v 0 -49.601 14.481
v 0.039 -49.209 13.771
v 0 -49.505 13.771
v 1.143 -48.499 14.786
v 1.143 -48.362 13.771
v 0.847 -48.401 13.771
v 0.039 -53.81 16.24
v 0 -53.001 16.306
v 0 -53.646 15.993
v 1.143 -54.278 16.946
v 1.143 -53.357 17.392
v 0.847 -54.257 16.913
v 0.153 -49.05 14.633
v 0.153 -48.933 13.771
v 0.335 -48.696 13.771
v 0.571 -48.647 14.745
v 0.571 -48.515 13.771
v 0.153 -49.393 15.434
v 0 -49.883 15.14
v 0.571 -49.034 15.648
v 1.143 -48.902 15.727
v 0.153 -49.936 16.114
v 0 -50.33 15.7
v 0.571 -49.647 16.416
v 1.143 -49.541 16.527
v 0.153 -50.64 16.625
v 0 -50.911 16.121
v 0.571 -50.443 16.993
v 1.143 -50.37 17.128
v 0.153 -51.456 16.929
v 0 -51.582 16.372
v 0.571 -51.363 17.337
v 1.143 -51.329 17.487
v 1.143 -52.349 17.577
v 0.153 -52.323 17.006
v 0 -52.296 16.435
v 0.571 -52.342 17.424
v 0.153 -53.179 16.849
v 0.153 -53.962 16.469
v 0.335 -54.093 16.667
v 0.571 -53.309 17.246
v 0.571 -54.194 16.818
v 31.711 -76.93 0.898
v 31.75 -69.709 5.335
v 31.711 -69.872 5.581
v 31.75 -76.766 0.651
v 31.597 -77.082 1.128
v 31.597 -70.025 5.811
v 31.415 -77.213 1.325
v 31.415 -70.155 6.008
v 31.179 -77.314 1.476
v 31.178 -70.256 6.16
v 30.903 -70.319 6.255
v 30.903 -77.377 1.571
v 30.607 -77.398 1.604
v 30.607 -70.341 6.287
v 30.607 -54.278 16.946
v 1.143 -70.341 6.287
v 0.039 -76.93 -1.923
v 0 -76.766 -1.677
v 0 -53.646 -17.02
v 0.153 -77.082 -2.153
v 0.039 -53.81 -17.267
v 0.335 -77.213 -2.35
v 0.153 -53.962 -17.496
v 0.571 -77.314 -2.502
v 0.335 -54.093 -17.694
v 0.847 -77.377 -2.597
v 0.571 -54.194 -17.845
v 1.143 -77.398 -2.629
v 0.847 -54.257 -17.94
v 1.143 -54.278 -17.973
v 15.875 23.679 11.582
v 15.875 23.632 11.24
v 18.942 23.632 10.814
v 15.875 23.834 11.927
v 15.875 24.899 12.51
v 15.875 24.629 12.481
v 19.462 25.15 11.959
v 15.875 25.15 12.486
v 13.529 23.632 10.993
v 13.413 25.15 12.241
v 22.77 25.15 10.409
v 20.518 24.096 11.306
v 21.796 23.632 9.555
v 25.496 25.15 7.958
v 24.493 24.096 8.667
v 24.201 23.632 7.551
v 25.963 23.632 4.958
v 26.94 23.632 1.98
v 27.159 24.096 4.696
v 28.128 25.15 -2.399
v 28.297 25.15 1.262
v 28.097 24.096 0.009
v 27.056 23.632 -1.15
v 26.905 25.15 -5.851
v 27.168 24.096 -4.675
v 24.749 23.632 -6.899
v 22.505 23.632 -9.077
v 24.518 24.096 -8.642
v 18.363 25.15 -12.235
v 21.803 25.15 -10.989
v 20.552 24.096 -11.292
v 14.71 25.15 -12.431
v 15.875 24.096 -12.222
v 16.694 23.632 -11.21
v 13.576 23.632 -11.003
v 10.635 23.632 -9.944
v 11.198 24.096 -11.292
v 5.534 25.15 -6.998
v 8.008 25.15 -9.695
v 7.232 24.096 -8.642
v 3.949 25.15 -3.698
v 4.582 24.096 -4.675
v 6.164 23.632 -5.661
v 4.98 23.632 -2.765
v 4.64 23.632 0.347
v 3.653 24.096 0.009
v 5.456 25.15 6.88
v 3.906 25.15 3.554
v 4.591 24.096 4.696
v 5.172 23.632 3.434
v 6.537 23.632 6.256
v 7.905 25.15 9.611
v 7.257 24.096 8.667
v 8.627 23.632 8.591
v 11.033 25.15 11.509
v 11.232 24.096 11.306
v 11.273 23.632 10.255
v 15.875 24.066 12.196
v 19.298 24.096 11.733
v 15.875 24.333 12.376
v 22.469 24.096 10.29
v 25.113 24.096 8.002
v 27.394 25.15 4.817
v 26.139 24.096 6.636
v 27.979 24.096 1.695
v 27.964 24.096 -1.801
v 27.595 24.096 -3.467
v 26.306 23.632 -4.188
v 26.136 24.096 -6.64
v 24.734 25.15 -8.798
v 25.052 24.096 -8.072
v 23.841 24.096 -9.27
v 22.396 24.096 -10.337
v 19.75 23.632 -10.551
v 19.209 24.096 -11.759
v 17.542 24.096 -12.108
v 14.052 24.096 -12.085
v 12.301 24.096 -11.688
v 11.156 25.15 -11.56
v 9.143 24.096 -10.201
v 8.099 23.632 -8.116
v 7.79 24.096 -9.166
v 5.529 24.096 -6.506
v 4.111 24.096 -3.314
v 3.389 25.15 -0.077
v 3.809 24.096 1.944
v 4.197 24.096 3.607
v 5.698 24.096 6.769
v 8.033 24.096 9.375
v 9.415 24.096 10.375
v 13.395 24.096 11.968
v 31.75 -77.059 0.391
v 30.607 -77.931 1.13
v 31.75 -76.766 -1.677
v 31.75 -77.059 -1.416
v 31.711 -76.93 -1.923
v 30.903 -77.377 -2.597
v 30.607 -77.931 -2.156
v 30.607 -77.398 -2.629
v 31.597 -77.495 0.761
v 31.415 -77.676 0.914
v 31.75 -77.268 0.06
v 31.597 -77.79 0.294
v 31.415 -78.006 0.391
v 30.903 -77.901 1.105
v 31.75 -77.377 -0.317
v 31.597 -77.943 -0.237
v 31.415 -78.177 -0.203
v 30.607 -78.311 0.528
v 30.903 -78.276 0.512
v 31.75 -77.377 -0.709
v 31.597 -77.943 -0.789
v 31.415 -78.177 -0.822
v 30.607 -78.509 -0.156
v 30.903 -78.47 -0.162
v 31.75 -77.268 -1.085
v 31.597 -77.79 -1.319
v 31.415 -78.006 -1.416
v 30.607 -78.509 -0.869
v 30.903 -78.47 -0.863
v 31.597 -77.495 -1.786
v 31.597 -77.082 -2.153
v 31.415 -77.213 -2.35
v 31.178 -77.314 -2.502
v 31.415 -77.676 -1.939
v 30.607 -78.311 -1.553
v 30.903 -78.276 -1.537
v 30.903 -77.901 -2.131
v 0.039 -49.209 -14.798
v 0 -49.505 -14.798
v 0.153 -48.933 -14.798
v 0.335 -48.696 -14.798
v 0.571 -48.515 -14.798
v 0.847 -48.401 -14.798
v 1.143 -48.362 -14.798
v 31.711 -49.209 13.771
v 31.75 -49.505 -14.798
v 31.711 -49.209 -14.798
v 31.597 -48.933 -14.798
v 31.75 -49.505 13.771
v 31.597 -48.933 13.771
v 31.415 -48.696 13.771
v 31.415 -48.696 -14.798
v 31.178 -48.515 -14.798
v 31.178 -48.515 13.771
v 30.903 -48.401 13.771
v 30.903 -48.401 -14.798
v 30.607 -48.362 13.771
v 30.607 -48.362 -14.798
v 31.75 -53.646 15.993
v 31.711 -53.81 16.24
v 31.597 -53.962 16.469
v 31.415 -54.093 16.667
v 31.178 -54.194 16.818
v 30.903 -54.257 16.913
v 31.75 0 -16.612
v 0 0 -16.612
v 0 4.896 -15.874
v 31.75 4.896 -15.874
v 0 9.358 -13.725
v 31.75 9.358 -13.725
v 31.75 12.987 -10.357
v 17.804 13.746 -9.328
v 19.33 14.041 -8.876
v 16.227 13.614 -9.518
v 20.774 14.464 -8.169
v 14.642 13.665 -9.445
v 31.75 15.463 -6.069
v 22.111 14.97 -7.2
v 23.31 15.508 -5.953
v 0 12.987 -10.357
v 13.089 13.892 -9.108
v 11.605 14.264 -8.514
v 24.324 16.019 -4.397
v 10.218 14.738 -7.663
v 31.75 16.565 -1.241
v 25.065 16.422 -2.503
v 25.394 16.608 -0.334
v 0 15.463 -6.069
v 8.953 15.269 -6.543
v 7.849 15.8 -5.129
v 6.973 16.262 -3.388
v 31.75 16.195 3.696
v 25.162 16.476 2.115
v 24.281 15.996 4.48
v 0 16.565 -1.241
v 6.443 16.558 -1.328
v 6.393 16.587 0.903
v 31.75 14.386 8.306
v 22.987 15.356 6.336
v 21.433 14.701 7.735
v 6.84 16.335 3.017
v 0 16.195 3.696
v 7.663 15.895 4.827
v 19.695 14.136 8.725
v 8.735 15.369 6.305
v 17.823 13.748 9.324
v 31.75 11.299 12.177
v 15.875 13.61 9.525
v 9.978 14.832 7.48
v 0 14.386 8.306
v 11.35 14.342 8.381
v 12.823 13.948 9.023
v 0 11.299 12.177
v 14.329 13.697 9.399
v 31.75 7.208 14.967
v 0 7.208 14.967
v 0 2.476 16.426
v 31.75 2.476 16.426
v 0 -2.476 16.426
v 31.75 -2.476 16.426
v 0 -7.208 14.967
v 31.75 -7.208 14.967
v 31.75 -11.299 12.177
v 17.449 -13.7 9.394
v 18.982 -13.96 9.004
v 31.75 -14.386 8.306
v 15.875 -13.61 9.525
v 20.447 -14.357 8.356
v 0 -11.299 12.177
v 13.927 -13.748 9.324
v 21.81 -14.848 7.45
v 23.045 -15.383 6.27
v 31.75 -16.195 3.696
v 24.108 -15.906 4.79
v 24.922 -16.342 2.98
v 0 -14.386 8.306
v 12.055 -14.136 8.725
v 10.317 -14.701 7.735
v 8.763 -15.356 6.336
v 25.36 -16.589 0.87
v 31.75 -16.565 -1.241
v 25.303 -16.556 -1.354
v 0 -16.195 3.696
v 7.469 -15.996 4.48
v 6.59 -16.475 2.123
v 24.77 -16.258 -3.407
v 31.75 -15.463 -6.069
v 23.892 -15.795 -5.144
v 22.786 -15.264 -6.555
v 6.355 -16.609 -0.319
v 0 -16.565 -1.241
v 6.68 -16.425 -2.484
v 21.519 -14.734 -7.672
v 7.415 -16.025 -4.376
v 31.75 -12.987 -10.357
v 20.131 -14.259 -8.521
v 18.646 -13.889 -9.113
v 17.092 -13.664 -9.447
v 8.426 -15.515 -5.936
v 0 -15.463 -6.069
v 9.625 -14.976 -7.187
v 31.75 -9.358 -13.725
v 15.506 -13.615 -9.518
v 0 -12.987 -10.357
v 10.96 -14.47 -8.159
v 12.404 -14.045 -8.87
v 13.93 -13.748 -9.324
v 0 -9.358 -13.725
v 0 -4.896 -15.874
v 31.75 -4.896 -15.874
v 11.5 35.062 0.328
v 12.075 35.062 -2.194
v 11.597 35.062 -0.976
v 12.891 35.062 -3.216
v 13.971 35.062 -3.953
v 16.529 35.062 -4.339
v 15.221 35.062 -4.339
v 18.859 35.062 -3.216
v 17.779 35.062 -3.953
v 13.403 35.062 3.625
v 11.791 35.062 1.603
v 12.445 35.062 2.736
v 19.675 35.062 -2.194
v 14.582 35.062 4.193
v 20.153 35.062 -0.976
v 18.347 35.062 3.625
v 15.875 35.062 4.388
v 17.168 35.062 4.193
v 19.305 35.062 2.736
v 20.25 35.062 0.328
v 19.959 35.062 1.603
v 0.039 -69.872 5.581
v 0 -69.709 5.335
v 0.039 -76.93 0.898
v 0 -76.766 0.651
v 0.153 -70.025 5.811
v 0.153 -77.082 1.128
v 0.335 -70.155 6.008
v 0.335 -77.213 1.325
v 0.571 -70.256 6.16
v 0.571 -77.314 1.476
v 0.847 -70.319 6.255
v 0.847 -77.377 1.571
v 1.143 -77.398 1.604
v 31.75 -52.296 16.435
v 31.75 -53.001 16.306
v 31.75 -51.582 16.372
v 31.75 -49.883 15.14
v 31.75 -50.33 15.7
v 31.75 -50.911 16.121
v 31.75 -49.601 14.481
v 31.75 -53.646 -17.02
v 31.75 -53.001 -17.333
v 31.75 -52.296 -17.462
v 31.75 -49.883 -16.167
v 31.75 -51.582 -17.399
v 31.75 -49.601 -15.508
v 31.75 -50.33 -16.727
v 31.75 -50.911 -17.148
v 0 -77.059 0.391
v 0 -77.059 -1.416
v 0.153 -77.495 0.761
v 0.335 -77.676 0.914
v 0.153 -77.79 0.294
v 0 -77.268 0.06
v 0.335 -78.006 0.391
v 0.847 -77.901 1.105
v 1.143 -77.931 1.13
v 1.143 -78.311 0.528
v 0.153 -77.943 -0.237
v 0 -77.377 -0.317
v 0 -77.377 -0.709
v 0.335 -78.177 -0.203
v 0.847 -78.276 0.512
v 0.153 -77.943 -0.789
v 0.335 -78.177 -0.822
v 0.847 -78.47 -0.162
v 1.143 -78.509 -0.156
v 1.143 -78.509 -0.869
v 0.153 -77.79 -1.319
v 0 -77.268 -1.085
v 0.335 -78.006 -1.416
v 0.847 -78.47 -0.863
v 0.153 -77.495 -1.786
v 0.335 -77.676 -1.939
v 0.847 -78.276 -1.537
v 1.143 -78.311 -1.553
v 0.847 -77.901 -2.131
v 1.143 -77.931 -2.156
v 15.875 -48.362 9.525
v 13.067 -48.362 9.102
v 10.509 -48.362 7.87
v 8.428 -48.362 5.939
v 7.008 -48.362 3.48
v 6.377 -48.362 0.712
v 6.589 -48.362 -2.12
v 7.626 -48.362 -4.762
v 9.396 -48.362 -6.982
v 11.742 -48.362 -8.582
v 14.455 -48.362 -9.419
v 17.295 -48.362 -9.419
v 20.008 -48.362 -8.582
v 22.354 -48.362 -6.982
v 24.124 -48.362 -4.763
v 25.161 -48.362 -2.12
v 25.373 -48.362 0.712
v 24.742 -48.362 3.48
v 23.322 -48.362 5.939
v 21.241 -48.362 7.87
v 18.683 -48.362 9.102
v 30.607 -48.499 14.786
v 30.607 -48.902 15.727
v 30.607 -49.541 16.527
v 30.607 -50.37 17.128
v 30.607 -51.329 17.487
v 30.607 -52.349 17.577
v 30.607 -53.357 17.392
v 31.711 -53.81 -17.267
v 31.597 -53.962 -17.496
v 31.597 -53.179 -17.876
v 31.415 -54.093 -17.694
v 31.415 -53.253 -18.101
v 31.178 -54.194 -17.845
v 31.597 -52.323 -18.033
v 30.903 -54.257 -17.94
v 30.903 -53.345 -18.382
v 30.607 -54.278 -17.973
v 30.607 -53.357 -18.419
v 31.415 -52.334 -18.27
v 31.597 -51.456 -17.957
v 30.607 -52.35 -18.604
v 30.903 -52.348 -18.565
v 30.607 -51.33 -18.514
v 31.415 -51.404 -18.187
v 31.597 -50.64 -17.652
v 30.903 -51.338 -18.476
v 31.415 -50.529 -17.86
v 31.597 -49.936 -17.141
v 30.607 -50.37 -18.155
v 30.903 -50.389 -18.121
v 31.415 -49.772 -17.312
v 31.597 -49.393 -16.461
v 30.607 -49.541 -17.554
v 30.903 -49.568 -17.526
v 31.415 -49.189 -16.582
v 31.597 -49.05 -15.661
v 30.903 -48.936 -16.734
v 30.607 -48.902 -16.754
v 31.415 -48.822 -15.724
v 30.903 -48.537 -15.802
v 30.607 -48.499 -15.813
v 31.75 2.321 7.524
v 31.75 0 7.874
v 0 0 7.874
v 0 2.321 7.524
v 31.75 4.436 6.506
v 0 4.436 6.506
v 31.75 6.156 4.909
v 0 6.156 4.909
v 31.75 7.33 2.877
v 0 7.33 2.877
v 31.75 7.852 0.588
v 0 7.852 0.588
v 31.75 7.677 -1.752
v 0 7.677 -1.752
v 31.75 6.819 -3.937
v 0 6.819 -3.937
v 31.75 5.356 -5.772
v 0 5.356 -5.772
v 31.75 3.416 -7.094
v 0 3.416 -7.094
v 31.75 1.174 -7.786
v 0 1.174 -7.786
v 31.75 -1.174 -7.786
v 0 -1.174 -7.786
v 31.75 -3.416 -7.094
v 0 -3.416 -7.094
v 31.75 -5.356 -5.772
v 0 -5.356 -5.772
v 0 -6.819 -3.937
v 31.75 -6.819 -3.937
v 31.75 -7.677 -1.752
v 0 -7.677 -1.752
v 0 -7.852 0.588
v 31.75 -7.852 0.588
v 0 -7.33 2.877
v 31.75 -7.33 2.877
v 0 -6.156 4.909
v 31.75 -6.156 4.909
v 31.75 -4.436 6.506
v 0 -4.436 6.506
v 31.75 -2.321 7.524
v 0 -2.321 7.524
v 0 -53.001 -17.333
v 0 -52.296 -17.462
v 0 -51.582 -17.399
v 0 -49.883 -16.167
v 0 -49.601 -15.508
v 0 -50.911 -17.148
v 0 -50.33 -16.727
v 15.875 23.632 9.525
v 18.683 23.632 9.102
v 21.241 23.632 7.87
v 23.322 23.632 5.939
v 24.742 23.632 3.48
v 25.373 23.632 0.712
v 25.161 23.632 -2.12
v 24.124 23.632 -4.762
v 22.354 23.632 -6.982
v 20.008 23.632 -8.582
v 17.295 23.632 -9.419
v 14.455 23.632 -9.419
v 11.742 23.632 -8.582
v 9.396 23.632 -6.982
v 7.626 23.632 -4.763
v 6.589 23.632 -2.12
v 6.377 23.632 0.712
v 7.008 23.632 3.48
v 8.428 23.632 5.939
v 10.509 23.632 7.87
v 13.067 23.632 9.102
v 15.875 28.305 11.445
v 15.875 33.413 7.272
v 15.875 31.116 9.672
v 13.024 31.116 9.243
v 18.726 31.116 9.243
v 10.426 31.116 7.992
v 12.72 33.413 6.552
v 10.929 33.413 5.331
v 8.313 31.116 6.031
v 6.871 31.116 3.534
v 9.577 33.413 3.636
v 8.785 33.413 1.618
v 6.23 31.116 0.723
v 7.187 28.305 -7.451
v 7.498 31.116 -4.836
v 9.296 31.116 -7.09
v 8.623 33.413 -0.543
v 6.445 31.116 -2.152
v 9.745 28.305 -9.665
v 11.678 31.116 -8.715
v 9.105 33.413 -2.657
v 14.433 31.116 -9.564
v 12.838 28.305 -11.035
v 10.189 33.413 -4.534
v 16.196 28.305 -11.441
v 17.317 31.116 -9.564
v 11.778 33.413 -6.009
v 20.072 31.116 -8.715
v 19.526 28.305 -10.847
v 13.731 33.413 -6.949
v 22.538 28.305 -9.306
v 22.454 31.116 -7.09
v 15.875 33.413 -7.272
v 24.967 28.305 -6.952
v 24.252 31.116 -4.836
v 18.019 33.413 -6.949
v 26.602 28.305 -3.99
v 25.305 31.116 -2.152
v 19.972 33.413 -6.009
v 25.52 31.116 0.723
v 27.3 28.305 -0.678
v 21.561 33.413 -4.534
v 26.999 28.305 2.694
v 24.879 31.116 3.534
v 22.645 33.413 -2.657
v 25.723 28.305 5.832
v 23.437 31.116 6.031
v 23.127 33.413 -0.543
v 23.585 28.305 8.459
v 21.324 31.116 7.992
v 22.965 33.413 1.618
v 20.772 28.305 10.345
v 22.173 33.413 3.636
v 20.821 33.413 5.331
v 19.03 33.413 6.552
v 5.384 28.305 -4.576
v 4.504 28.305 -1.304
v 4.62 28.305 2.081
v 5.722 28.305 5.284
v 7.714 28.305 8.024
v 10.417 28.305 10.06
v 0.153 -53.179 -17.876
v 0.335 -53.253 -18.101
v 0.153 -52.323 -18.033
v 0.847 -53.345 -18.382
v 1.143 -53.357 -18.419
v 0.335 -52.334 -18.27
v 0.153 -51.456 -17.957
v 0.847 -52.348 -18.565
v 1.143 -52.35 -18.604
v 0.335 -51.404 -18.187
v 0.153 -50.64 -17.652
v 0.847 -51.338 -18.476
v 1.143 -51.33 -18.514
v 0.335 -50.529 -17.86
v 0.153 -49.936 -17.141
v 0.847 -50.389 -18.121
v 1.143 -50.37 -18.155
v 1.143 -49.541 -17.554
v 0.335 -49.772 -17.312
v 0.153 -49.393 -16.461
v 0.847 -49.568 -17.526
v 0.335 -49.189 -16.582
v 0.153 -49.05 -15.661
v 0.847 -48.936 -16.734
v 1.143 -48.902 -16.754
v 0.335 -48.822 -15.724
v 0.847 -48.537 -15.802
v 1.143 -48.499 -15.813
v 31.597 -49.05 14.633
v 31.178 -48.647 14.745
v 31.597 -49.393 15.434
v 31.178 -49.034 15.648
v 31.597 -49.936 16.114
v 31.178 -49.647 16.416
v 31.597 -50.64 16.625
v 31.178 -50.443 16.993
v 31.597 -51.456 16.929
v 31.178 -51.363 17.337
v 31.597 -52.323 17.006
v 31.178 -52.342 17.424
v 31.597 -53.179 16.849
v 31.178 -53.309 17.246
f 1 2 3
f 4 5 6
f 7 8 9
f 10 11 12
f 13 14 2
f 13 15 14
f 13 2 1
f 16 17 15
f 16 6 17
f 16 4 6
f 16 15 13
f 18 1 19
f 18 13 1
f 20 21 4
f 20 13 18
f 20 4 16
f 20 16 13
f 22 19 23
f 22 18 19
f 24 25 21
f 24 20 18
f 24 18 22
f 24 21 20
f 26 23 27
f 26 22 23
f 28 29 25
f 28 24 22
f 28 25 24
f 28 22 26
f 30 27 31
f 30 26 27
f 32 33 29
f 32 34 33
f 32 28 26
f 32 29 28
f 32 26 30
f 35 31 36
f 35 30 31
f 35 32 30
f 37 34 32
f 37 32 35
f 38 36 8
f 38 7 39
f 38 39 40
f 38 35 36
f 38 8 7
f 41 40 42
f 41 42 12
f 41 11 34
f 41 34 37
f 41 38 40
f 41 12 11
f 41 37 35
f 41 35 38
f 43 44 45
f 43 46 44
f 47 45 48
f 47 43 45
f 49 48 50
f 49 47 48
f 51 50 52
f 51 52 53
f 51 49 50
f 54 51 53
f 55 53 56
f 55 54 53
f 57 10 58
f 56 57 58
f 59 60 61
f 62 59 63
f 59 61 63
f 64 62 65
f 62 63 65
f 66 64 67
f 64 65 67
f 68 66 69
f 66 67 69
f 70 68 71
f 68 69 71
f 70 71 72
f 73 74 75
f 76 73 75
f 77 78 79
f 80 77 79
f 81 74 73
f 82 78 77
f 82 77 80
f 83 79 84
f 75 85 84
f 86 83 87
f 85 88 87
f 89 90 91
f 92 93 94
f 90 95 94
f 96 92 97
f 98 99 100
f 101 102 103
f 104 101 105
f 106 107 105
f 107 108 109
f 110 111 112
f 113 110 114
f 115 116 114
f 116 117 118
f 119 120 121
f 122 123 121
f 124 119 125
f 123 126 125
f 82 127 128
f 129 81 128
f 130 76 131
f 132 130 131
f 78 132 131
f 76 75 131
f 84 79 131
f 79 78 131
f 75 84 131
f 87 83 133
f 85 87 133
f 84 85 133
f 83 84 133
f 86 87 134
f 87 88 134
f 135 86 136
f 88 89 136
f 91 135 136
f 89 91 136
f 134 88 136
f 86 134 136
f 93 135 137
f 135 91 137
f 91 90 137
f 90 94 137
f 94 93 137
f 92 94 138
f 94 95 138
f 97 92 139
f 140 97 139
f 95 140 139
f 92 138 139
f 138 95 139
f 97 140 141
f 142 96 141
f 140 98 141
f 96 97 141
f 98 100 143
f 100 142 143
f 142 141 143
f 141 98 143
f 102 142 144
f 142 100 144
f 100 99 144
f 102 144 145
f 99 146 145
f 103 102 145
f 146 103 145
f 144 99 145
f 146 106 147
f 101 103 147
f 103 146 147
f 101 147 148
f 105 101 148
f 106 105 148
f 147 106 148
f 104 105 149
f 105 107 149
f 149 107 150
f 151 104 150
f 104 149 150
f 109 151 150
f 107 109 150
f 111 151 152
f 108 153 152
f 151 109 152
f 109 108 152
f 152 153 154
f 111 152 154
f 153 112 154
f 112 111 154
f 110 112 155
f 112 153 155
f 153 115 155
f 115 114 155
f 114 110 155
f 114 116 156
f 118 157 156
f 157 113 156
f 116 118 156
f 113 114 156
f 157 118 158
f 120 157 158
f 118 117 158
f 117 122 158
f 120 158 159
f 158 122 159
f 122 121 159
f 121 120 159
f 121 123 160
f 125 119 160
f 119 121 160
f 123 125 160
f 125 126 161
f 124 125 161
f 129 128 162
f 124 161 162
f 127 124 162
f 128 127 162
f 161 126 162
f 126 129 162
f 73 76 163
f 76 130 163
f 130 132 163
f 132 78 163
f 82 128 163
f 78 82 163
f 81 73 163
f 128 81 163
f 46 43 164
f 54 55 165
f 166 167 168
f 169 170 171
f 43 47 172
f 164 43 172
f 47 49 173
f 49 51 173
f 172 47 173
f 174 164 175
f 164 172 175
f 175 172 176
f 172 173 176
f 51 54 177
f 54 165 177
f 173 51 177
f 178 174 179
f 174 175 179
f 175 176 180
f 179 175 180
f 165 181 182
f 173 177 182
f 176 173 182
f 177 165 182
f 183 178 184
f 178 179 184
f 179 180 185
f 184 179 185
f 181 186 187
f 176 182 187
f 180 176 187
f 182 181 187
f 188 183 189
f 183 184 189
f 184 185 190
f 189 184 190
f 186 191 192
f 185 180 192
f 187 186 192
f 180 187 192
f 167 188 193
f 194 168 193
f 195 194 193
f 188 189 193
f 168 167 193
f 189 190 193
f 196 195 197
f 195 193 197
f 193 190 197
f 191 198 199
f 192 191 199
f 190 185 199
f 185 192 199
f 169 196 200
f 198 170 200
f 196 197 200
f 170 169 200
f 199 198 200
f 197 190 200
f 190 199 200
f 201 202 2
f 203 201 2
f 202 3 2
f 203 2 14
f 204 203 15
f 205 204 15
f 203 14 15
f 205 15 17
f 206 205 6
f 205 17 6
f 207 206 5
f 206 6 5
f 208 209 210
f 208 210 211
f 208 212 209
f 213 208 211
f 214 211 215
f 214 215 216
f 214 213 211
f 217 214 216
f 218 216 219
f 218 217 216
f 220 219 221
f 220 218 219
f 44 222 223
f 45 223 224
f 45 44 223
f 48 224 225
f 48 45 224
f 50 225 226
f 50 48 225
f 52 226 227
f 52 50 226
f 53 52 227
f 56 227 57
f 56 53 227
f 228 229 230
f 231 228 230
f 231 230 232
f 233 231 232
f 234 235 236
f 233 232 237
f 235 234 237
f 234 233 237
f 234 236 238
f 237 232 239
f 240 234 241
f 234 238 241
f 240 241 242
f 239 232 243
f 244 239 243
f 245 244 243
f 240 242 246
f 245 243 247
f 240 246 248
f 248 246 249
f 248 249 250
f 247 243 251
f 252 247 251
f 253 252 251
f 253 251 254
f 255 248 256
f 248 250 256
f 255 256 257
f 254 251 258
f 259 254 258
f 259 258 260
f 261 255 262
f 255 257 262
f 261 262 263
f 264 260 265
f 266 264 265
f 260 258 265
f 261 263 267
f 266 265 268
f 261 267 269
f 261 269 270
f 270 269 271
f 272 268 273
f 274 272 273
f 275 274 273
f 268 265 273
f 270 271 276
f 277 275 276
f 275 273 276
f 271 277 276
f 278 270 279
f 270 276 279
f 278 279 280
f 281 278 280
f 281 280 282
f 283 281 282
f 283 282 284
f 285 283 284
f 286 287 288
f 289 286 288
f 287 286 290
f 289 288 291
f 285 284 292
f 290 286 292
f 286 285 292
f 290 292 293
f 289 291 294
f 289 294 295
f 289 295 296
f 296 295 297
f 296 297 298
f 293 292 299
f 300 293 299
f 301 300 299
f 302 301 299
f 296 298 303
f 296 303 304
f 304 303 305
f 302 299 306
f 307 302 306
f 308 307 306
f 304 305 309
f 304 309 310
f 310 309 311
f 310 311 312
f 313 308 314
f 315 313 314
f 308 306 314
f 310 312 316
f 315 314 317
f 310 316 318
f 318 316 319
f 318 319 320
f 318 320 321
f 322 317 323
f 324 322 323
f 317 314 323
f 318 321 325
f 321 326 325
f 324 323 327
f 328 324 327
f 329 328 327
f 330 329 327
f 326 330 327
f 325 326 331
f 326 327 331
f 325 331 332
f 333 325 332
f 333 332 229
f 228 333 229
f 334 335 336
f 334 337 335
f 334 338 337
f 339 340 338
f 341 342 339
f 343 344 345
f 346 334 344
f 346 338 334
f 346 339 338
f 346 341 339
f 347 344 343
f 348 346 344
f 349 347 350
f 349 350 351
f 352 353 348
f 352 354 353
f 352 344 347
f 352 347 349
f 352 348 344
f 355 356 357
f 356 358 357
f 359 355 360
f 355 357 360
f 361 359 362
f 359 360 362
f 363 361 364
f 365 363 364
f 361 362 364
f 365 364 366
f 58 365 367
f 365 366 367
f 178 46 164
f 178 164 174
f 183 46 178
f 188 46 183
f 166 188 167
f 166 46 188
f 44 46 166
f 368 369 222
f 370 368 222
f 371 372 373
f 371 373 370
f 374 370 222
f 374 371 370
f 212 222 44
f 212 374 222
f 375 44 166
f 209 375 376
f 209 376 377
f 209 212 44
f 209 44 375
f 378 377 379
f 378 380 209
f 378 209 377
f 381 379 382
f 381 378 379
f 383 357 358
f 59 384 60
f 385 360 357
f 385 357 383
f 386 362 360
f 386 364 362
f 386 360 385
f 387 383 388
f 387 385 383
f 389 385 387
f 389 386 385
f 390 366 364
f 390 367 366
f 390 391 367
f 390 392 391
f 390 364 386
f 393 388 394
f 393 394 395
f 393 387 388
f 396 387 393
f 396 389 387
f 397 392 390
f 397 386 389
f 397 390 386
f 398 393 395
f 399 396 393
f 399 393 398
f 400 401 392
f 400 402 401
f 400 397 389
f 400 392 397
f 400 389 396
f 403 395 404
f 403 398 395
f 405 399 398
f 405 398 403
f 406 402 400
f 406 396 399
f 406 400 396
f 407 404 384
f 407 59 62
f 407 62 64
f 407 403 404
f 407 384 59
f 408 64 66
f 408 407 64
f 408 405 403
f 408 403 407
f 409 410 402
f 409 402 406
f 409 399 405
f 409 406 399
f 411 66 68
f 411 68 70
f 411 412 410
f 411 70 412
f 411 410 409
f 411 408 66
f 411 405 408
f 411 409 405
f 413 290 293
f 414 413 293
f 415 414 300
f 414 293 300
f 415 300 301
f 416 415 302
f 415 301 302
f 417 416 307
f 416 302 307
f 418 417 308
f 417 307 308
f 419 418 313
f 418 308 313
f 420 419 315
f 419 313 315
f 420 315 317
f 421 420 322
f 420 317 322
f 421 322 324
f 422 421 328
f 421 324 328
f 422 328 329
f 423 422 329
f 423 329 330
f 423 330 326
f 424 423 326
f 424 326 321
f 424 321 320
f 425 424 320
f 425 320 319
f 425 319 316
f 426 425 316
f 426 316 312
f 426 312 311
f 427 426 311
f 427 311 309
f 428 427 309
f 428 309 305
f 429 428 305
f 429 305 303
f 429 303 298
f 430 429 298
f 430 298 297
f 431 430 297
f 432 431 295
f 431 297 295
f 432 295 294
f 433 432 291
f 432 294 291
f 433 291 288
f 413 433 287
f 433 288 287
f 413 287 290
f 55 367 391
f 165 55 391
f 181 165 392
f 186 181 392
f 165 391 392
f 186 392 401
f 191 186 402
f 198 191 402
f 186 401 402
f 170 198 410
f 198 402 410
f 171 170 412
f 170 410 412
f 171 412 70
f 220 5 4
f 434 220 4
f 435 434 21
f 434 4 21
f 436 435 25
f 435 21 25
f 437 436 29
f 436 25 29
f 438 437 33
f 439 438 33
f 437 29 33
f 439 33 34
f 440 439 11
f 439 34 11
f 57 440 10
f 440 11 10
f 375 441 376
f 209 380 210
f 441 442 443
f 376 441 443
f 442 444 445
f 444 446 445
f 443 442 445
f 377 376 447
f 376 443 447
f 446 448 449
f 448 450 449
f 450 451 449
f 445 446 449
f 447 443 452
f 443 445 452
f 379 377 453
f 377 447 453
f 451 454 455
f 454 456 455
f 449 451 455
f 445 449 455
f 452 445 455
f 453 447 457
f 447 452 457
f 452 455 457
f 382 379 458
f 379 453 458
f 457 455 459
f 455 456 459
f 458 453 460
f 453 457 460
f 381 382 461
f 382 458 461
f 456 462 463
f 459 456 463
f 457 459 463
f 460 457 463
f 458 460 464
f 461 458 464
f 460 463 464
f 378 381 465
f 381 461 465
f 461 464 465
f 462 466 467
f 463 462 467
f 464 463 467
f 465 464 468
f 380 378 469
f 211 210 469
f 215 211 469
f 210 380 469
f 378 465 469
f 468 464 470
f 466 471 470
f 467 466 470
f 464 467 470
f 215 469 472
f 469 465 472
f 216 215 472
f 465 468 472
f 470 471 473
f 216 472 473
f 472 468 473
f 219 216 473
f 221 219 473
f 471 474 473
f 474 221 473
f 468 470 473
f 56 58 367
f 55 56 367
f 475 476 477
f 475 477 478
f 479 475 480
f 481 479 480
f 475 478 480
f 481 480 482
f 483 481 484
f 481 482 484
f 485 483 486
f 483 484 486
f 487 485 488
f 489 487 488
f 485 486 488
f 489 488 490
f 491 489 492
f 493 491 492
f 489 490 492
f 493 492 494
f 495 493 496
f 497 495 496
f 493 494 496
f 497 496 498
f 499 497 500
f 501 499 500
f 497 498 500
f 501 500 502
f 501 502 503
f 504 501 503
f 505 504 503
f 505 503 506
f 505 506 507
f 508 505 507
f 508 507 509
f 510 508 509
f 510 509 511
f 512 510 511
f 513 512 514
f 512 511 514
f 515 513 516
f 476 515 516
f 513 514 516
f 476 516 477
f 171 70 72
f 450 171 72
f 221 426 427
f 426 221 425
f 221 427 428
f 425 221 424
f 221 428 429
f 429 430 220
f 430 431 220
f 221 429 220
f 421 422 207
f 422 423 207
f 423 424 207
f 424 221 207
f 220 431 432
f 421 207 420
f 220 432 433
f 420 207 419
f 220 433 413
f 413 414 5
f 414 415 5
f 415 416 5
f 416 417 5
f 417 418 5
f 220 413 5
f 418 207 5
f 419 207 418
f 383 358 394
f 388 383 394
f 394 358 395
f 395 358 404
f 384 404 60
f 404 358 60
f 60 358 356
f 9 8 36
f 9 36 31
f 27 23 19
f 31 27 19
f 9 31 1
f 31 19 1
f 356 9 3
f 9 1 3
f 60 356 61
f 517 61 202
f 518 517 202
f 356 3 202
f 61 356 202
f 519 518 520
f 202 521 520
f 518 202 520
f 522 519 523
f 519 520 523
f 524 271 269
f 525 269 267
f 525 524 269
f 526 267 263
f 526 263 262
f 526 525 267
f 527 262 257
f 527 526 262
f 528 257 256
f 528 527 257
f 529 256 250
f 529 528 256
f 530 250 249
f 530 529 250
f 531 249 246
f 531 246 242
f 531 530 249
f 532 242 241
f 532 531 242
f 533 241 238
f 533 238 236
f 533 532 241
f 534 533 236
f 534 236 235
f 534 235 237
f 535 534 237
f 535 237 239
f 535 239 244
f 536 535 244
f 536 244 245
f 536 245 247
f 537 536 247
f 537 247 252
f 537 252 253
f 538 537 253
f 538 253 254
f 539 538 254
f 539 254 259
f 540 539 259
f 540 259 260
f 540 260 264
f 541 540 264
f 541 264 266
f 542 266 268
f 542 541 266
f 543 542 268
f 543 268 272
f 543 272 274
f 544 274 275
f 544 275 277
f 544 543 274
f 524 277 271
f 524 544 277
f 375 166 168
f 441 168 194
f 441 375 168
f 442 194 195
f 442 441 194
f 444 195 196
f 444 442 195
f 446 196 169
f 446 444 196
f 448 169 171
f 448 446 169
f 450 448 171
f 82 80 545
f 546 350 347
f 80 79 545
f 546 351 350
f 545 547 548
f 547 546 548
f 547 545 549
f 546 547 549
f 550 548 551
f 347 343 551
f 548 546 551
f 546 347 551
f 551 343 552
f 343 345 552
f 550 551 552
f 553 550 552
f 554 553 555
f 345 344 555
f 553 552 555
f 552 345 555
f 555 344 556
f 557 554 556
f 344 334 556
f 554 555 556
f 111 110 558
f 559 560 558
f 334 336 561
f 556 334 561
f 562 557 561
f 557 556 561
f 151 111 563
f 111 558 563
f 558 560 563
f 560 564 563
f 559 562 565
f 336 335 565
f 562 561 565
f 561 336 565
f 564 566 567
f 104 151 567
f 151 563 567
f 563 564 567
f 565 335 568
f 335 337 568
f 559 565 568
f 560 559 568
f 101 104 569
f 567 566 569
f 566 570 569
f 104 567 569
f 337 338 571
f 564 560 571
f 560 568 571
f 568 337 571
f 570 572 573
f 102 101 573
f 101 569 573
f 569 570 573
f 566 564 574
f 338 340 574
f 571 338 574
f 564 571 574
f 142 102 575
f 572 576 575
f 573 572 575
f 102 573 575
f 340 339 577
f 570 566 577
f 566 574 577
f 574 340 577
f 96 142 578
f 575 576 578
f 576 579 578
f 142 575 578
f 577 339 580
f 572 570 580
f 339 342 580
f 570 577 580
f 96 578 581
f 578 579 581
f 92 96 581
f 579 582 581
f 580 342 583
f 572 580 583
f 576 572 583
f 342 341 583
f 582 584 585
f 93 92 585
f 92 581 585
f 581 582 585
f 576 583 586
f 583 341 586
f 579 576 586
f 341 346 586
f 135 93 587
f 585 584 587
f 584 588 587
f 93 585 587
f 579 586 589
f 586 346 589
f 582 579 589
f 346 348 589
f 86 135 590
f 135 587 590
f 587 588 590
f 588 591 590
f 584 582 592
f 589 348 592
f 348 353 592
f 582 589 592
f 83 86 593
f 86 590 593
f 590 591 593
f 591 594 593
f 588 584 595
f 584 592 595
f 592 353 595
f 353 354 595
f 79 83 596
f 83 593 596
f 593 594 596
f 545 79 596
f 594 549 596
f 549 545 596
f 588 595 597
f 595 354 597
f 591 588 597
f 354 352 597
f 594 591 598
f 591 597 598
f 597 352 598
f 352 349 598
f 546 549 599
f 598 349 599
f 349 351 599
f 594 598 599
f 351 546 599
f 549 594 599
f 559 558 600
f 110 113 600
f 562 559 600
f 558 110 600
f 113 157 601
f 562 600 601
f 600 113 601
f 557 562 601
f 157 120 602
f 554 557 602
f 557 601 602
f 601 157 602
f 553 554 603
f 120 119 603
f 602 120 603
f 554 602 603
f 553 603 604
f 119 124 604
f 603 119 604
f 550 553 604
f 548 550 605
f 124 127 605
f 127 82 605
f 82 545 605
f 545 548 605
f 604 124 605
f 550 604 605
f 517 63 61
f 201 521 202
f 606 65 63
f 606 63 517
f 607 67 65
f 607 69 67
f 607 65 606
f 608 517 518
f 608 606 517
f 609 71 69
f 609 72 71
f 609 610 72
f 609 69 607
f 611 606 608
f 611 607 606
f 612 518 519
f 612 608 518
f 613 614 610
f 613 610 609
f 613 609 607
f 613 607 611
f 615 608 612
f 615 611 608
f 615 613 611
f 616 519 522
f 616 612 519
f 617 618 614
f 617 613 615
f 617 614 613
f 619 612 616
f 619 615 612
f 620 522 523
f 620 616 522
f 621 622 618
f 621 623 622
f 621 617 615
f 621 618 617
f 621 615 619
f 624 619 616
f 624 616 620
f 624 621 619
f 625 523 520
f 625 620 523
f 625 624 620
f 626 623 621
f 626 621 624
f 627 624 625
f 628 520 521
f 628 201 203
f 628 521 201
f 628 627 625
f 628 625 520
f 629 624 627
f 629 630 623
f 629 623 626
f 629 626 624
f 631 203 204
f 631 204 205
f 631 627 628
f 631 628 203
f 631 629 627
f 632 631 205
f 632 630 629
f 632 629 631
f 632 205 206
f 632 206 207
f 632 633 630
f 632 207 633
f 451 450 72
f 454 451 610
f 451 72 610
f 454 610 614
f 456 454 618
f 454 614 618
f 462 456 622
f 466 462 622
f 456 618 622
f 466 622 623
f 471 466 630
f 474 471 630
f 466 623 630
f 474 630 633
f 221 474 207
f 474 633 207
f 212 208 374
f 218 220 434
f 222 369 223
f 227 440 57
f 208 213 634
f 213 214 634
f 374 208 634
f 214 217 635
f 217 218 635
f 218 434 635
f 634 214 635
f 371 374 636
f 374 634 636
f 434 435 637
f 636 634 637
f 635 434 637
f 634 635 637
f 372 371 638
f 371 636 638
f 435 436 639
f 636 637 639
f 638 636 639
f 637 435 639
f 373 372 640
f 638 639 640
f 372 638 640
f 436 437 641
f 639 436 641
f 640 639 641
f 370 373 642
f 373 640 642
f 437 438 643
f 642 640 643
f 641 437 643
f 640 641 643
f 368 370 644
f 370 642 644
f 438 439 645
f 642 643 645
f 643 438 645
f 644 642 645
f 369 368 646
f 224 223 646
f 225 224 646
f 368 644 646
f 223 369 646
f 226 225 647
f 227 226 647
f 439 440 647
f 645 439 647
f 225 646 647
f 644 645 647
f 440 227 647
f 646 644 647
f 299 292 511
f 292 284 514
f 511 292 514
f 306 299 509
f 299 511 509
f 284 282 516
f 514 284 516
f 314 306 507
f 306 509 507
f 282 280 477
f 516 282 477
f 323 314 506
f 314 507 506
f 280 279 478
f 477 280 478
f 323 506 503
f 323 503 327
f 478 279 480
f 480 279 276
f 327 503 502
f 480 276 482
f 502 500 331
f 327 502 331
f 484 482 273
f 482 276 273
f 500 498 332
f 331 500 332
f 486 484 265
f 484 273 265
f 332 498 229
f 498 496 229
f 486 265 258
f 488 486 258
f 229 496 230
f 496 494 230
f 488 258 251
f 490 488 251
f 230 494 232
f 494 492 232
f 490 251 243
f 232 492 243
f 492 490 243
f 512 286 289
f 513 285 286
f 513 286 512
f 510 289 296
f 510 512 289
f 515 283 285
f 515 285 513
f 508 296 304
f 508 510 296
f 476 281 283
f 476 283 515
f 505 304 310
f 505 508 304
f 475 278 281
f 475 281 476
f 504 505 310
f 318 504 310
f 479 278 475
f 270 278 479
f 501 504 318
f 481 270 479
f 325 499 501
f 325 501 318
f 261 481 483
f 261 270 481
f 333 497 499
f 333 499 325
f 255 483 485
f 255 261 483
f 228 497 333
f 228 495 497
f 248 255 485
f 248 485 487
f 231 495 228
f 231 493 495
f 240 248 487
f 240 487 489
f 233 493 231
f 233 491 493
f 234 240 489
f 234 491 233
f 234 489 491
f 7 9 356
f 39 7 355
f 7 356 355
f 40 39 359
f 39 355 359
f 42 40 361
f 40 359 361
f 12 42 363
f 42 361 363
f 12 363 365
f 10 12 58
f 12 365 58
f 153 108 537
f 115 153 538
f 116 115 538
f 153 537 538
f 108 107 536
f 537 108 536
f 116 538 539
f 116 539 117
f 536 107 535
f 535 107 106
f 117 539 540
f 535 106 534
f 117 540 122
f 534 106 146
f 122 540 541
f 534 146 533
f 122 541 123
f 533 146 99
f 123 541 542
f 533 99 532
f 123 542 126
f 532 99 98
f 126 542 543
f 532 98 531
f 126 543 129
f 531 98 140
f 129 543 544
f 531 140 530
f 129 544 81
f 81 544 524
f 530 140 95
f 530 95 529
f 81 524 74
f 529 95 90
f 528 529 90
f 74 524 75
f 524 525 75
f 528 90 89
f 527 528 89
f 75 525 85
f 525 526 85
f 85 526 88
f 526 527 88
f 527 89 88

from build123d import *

# Parameters (mm, degrees)
SKETCH1_R                = 16.6116
BOSS_EXTRUDE1_DEPTH      = 31.75
SKETCH5_R                = 7.874
CUT_EXTRUDE4_DEPTH       = 31.75
SKETCH7_R                = 9.525
BOSS_EXTRUDE2_DEPTH      = 14.732
SKETCH8_R                = 12.7
BOSS_EXTRUDE3_DEPTH      = 11.43
FILLET5_R                = 1.27
BOSS_EXTRUDE4_DEPTH      = 15.875
BOSS_EXTRUDE4_DEPTH_BACK = 15.875
BOSS_EXTRUDE5_DEPTH      = 31.75
BOSS_EXTRUDE5_DEPTH_BACK = 3.81
SKETCH13_R               = 9.525
FILLET6_R                = 1.143


with BuildPart() as part:
    # Sketch1 → Boss-Extrude1 (new body)
    with BuildSketch(Plane(origin=(0, 0, 0), x_dir=(0, 0, -1), z_dir=(1, 0, 0))):
        Circle(SKETCH1_R)
    extrude(amount=BOSS_EXTRUDE1_DEPTH)

    # Sketch5 → Cut-Extrude4 (cut)
    with BuildSketch(Plane.ZY):
        Circle(SKETCH5_R)
    extrude(amount=-CUT_EXTRUDE4_DEPTH, mode=Mode.SUBTRACT)

    # Sketch7 → Boss-Extrude2 (add)
    with BuildSketch(Plane(origin=(0, 23.63216, 0), x_dir=(1, 0, 0), z_dir=(0, 1, 0))):
        with Locations(Location((15.875, 0, 0), (0, 0, 270))):
            Circle(SKETCH7_R)
    extrude(amount=-BOSS_EXTRUDE2_DEPTH)

    # Sketch8 → Boss-Extrude3 (add)
    with BuildSketch(Plane(origin=(0, 23.63216, 0), x_dir=(1, 0, 0), z_dir=(0, 1, 0))):
        with Locations(Location((15.875, 0, 0), (0, 0, 270))):
            Circle(SKETCH8_R)
    extrude(amount=BOSS_EXTRUDE3_DEPTH)

    # Sketch10 → Cut-Revolve1 (revolve, cut)
    with BuildSketch(Plane.XY, mode=Mode.PRIVATE) as cut_revolve1_sk:
        with BuildLine():
            Line((11.487410409, 35.062159614), (3.175, 35.06216))
            Line((3.175, 35.06216), (3.175, 23.63216))
            ThreePointArc((3.175, 23.63216), (5.734420744, 30.508413369), (11.487410409, 35.062159614))
        make_face()
    revolve(cut_revolve1_sk.sketch.rotate(Axis((15.875, 35.06216, 0), (0, -1, 0)), 270), axis=Axis((15.875, 35.06216, 0), (0, -1, 0)), mode=Mode.SUBTRACT)

    # Fillet5
    fillet5_edges = [part.edges().sort_by_distance(p)[0] for p in [
        (15.875, 23.63216, -12.7),
    ]]
    fillet(fillet5_edges, radius=FILLET5_R)



with BuildPart() as body_2:
    # Sketch12 → Boss-Extrude4 (new, two sides: drawn at the far end of the back side and taken through both)
    with BuildSketch(Plane(origin=(15.875, 0, 0), x_dir=(0, 0, -1), z_dir=(1, 0, 0)).offset(-BOSS_EXTRUDE4_DEPTH_BACK)):
        with BuildLine():
            Line((2.629138572, -77.398426312), (7.313053442, -70.340553032))
            Line((7.313053442, -70.340553032), (17.972630658, -54.27835991))
            ThreePointArc((17.972630658, -54.27835991), (18.155391887, -50.370302586), (14.798097199, -48.3616))
            Line((14.798097199, -48.3616), (-13.770933928, -48.3616))
            ThreePointArc((-13.770933928, -48.3616), (-17.128181434, -50.370214649), (-16.945577748, -54.278193604))
            Line((-16.945577748, -54.278193604), (-6.287102166, -70.340553032))
            Line((-6.287102166, -70.340553032), (-1.603719855, -77.398426312))
            ThreePointArc((-1.603719855, -77.398426312), (0.512709359, -78.534030576), (2.629138572, -77.398426312))
        make_face()
    extrude(amount=BOSS_EXTRUDE4_DEPTH + BOSS_EXTRUDE4_DEPTH_BACK)


with BuildPart() as part_1:
    add(part.part)

    add(body_2.part)  # Boss-Extrude5 merges body 2
    # Sketch13 → Boss-Extrude5 (add, two sides: drawn at the far end of the back side and taken through both)
    with BuildSketch(Plane(origin=(0, -16.6116, 0), x_dir=(-1, 0, 0), z_dir=(0, -1, 0)).offset(-BOSS_EXTRUDE5_DEPTH_BACK)):
        with Locations(Location((-15.875, 0, 0), (0, 0, 270))):
            Circle(SKETCH13_R)
    extrude(amount=BOSS_EXTRUDE5_DEPTH + BOSS_EXTRUDE5_DEPTH_BACK)

    # Fillet6
    fillet6_edges = [part_1.edges().sort_by_distance(p)[0] for p in [
        (0, -50.370214649, 17.128181434),
        (0, -48.3616, -0.513581636),
        (0, -50.370302586, -18.155391887),
        (0, -65.838393111, -10.300884615),
        (0, -78.534030576, -0.512709359),
        (0, -65.838309958, 9.274648801),
        (31.75, -50.370214649, 17.128181434),
        (31.75, -65.838309958, 9.274648801),
        (31.75, -78.534030576, -0.512709359),
        (31.75, -65.838393111, -10.300884615),
        (31.75, -50.370302586, -18.155391887),
        (31.75, -48.3616, -0.513581636),
    ]]
    fillet(fillet6_edges, radius=FILLET6_R)


solid = part_1.part
